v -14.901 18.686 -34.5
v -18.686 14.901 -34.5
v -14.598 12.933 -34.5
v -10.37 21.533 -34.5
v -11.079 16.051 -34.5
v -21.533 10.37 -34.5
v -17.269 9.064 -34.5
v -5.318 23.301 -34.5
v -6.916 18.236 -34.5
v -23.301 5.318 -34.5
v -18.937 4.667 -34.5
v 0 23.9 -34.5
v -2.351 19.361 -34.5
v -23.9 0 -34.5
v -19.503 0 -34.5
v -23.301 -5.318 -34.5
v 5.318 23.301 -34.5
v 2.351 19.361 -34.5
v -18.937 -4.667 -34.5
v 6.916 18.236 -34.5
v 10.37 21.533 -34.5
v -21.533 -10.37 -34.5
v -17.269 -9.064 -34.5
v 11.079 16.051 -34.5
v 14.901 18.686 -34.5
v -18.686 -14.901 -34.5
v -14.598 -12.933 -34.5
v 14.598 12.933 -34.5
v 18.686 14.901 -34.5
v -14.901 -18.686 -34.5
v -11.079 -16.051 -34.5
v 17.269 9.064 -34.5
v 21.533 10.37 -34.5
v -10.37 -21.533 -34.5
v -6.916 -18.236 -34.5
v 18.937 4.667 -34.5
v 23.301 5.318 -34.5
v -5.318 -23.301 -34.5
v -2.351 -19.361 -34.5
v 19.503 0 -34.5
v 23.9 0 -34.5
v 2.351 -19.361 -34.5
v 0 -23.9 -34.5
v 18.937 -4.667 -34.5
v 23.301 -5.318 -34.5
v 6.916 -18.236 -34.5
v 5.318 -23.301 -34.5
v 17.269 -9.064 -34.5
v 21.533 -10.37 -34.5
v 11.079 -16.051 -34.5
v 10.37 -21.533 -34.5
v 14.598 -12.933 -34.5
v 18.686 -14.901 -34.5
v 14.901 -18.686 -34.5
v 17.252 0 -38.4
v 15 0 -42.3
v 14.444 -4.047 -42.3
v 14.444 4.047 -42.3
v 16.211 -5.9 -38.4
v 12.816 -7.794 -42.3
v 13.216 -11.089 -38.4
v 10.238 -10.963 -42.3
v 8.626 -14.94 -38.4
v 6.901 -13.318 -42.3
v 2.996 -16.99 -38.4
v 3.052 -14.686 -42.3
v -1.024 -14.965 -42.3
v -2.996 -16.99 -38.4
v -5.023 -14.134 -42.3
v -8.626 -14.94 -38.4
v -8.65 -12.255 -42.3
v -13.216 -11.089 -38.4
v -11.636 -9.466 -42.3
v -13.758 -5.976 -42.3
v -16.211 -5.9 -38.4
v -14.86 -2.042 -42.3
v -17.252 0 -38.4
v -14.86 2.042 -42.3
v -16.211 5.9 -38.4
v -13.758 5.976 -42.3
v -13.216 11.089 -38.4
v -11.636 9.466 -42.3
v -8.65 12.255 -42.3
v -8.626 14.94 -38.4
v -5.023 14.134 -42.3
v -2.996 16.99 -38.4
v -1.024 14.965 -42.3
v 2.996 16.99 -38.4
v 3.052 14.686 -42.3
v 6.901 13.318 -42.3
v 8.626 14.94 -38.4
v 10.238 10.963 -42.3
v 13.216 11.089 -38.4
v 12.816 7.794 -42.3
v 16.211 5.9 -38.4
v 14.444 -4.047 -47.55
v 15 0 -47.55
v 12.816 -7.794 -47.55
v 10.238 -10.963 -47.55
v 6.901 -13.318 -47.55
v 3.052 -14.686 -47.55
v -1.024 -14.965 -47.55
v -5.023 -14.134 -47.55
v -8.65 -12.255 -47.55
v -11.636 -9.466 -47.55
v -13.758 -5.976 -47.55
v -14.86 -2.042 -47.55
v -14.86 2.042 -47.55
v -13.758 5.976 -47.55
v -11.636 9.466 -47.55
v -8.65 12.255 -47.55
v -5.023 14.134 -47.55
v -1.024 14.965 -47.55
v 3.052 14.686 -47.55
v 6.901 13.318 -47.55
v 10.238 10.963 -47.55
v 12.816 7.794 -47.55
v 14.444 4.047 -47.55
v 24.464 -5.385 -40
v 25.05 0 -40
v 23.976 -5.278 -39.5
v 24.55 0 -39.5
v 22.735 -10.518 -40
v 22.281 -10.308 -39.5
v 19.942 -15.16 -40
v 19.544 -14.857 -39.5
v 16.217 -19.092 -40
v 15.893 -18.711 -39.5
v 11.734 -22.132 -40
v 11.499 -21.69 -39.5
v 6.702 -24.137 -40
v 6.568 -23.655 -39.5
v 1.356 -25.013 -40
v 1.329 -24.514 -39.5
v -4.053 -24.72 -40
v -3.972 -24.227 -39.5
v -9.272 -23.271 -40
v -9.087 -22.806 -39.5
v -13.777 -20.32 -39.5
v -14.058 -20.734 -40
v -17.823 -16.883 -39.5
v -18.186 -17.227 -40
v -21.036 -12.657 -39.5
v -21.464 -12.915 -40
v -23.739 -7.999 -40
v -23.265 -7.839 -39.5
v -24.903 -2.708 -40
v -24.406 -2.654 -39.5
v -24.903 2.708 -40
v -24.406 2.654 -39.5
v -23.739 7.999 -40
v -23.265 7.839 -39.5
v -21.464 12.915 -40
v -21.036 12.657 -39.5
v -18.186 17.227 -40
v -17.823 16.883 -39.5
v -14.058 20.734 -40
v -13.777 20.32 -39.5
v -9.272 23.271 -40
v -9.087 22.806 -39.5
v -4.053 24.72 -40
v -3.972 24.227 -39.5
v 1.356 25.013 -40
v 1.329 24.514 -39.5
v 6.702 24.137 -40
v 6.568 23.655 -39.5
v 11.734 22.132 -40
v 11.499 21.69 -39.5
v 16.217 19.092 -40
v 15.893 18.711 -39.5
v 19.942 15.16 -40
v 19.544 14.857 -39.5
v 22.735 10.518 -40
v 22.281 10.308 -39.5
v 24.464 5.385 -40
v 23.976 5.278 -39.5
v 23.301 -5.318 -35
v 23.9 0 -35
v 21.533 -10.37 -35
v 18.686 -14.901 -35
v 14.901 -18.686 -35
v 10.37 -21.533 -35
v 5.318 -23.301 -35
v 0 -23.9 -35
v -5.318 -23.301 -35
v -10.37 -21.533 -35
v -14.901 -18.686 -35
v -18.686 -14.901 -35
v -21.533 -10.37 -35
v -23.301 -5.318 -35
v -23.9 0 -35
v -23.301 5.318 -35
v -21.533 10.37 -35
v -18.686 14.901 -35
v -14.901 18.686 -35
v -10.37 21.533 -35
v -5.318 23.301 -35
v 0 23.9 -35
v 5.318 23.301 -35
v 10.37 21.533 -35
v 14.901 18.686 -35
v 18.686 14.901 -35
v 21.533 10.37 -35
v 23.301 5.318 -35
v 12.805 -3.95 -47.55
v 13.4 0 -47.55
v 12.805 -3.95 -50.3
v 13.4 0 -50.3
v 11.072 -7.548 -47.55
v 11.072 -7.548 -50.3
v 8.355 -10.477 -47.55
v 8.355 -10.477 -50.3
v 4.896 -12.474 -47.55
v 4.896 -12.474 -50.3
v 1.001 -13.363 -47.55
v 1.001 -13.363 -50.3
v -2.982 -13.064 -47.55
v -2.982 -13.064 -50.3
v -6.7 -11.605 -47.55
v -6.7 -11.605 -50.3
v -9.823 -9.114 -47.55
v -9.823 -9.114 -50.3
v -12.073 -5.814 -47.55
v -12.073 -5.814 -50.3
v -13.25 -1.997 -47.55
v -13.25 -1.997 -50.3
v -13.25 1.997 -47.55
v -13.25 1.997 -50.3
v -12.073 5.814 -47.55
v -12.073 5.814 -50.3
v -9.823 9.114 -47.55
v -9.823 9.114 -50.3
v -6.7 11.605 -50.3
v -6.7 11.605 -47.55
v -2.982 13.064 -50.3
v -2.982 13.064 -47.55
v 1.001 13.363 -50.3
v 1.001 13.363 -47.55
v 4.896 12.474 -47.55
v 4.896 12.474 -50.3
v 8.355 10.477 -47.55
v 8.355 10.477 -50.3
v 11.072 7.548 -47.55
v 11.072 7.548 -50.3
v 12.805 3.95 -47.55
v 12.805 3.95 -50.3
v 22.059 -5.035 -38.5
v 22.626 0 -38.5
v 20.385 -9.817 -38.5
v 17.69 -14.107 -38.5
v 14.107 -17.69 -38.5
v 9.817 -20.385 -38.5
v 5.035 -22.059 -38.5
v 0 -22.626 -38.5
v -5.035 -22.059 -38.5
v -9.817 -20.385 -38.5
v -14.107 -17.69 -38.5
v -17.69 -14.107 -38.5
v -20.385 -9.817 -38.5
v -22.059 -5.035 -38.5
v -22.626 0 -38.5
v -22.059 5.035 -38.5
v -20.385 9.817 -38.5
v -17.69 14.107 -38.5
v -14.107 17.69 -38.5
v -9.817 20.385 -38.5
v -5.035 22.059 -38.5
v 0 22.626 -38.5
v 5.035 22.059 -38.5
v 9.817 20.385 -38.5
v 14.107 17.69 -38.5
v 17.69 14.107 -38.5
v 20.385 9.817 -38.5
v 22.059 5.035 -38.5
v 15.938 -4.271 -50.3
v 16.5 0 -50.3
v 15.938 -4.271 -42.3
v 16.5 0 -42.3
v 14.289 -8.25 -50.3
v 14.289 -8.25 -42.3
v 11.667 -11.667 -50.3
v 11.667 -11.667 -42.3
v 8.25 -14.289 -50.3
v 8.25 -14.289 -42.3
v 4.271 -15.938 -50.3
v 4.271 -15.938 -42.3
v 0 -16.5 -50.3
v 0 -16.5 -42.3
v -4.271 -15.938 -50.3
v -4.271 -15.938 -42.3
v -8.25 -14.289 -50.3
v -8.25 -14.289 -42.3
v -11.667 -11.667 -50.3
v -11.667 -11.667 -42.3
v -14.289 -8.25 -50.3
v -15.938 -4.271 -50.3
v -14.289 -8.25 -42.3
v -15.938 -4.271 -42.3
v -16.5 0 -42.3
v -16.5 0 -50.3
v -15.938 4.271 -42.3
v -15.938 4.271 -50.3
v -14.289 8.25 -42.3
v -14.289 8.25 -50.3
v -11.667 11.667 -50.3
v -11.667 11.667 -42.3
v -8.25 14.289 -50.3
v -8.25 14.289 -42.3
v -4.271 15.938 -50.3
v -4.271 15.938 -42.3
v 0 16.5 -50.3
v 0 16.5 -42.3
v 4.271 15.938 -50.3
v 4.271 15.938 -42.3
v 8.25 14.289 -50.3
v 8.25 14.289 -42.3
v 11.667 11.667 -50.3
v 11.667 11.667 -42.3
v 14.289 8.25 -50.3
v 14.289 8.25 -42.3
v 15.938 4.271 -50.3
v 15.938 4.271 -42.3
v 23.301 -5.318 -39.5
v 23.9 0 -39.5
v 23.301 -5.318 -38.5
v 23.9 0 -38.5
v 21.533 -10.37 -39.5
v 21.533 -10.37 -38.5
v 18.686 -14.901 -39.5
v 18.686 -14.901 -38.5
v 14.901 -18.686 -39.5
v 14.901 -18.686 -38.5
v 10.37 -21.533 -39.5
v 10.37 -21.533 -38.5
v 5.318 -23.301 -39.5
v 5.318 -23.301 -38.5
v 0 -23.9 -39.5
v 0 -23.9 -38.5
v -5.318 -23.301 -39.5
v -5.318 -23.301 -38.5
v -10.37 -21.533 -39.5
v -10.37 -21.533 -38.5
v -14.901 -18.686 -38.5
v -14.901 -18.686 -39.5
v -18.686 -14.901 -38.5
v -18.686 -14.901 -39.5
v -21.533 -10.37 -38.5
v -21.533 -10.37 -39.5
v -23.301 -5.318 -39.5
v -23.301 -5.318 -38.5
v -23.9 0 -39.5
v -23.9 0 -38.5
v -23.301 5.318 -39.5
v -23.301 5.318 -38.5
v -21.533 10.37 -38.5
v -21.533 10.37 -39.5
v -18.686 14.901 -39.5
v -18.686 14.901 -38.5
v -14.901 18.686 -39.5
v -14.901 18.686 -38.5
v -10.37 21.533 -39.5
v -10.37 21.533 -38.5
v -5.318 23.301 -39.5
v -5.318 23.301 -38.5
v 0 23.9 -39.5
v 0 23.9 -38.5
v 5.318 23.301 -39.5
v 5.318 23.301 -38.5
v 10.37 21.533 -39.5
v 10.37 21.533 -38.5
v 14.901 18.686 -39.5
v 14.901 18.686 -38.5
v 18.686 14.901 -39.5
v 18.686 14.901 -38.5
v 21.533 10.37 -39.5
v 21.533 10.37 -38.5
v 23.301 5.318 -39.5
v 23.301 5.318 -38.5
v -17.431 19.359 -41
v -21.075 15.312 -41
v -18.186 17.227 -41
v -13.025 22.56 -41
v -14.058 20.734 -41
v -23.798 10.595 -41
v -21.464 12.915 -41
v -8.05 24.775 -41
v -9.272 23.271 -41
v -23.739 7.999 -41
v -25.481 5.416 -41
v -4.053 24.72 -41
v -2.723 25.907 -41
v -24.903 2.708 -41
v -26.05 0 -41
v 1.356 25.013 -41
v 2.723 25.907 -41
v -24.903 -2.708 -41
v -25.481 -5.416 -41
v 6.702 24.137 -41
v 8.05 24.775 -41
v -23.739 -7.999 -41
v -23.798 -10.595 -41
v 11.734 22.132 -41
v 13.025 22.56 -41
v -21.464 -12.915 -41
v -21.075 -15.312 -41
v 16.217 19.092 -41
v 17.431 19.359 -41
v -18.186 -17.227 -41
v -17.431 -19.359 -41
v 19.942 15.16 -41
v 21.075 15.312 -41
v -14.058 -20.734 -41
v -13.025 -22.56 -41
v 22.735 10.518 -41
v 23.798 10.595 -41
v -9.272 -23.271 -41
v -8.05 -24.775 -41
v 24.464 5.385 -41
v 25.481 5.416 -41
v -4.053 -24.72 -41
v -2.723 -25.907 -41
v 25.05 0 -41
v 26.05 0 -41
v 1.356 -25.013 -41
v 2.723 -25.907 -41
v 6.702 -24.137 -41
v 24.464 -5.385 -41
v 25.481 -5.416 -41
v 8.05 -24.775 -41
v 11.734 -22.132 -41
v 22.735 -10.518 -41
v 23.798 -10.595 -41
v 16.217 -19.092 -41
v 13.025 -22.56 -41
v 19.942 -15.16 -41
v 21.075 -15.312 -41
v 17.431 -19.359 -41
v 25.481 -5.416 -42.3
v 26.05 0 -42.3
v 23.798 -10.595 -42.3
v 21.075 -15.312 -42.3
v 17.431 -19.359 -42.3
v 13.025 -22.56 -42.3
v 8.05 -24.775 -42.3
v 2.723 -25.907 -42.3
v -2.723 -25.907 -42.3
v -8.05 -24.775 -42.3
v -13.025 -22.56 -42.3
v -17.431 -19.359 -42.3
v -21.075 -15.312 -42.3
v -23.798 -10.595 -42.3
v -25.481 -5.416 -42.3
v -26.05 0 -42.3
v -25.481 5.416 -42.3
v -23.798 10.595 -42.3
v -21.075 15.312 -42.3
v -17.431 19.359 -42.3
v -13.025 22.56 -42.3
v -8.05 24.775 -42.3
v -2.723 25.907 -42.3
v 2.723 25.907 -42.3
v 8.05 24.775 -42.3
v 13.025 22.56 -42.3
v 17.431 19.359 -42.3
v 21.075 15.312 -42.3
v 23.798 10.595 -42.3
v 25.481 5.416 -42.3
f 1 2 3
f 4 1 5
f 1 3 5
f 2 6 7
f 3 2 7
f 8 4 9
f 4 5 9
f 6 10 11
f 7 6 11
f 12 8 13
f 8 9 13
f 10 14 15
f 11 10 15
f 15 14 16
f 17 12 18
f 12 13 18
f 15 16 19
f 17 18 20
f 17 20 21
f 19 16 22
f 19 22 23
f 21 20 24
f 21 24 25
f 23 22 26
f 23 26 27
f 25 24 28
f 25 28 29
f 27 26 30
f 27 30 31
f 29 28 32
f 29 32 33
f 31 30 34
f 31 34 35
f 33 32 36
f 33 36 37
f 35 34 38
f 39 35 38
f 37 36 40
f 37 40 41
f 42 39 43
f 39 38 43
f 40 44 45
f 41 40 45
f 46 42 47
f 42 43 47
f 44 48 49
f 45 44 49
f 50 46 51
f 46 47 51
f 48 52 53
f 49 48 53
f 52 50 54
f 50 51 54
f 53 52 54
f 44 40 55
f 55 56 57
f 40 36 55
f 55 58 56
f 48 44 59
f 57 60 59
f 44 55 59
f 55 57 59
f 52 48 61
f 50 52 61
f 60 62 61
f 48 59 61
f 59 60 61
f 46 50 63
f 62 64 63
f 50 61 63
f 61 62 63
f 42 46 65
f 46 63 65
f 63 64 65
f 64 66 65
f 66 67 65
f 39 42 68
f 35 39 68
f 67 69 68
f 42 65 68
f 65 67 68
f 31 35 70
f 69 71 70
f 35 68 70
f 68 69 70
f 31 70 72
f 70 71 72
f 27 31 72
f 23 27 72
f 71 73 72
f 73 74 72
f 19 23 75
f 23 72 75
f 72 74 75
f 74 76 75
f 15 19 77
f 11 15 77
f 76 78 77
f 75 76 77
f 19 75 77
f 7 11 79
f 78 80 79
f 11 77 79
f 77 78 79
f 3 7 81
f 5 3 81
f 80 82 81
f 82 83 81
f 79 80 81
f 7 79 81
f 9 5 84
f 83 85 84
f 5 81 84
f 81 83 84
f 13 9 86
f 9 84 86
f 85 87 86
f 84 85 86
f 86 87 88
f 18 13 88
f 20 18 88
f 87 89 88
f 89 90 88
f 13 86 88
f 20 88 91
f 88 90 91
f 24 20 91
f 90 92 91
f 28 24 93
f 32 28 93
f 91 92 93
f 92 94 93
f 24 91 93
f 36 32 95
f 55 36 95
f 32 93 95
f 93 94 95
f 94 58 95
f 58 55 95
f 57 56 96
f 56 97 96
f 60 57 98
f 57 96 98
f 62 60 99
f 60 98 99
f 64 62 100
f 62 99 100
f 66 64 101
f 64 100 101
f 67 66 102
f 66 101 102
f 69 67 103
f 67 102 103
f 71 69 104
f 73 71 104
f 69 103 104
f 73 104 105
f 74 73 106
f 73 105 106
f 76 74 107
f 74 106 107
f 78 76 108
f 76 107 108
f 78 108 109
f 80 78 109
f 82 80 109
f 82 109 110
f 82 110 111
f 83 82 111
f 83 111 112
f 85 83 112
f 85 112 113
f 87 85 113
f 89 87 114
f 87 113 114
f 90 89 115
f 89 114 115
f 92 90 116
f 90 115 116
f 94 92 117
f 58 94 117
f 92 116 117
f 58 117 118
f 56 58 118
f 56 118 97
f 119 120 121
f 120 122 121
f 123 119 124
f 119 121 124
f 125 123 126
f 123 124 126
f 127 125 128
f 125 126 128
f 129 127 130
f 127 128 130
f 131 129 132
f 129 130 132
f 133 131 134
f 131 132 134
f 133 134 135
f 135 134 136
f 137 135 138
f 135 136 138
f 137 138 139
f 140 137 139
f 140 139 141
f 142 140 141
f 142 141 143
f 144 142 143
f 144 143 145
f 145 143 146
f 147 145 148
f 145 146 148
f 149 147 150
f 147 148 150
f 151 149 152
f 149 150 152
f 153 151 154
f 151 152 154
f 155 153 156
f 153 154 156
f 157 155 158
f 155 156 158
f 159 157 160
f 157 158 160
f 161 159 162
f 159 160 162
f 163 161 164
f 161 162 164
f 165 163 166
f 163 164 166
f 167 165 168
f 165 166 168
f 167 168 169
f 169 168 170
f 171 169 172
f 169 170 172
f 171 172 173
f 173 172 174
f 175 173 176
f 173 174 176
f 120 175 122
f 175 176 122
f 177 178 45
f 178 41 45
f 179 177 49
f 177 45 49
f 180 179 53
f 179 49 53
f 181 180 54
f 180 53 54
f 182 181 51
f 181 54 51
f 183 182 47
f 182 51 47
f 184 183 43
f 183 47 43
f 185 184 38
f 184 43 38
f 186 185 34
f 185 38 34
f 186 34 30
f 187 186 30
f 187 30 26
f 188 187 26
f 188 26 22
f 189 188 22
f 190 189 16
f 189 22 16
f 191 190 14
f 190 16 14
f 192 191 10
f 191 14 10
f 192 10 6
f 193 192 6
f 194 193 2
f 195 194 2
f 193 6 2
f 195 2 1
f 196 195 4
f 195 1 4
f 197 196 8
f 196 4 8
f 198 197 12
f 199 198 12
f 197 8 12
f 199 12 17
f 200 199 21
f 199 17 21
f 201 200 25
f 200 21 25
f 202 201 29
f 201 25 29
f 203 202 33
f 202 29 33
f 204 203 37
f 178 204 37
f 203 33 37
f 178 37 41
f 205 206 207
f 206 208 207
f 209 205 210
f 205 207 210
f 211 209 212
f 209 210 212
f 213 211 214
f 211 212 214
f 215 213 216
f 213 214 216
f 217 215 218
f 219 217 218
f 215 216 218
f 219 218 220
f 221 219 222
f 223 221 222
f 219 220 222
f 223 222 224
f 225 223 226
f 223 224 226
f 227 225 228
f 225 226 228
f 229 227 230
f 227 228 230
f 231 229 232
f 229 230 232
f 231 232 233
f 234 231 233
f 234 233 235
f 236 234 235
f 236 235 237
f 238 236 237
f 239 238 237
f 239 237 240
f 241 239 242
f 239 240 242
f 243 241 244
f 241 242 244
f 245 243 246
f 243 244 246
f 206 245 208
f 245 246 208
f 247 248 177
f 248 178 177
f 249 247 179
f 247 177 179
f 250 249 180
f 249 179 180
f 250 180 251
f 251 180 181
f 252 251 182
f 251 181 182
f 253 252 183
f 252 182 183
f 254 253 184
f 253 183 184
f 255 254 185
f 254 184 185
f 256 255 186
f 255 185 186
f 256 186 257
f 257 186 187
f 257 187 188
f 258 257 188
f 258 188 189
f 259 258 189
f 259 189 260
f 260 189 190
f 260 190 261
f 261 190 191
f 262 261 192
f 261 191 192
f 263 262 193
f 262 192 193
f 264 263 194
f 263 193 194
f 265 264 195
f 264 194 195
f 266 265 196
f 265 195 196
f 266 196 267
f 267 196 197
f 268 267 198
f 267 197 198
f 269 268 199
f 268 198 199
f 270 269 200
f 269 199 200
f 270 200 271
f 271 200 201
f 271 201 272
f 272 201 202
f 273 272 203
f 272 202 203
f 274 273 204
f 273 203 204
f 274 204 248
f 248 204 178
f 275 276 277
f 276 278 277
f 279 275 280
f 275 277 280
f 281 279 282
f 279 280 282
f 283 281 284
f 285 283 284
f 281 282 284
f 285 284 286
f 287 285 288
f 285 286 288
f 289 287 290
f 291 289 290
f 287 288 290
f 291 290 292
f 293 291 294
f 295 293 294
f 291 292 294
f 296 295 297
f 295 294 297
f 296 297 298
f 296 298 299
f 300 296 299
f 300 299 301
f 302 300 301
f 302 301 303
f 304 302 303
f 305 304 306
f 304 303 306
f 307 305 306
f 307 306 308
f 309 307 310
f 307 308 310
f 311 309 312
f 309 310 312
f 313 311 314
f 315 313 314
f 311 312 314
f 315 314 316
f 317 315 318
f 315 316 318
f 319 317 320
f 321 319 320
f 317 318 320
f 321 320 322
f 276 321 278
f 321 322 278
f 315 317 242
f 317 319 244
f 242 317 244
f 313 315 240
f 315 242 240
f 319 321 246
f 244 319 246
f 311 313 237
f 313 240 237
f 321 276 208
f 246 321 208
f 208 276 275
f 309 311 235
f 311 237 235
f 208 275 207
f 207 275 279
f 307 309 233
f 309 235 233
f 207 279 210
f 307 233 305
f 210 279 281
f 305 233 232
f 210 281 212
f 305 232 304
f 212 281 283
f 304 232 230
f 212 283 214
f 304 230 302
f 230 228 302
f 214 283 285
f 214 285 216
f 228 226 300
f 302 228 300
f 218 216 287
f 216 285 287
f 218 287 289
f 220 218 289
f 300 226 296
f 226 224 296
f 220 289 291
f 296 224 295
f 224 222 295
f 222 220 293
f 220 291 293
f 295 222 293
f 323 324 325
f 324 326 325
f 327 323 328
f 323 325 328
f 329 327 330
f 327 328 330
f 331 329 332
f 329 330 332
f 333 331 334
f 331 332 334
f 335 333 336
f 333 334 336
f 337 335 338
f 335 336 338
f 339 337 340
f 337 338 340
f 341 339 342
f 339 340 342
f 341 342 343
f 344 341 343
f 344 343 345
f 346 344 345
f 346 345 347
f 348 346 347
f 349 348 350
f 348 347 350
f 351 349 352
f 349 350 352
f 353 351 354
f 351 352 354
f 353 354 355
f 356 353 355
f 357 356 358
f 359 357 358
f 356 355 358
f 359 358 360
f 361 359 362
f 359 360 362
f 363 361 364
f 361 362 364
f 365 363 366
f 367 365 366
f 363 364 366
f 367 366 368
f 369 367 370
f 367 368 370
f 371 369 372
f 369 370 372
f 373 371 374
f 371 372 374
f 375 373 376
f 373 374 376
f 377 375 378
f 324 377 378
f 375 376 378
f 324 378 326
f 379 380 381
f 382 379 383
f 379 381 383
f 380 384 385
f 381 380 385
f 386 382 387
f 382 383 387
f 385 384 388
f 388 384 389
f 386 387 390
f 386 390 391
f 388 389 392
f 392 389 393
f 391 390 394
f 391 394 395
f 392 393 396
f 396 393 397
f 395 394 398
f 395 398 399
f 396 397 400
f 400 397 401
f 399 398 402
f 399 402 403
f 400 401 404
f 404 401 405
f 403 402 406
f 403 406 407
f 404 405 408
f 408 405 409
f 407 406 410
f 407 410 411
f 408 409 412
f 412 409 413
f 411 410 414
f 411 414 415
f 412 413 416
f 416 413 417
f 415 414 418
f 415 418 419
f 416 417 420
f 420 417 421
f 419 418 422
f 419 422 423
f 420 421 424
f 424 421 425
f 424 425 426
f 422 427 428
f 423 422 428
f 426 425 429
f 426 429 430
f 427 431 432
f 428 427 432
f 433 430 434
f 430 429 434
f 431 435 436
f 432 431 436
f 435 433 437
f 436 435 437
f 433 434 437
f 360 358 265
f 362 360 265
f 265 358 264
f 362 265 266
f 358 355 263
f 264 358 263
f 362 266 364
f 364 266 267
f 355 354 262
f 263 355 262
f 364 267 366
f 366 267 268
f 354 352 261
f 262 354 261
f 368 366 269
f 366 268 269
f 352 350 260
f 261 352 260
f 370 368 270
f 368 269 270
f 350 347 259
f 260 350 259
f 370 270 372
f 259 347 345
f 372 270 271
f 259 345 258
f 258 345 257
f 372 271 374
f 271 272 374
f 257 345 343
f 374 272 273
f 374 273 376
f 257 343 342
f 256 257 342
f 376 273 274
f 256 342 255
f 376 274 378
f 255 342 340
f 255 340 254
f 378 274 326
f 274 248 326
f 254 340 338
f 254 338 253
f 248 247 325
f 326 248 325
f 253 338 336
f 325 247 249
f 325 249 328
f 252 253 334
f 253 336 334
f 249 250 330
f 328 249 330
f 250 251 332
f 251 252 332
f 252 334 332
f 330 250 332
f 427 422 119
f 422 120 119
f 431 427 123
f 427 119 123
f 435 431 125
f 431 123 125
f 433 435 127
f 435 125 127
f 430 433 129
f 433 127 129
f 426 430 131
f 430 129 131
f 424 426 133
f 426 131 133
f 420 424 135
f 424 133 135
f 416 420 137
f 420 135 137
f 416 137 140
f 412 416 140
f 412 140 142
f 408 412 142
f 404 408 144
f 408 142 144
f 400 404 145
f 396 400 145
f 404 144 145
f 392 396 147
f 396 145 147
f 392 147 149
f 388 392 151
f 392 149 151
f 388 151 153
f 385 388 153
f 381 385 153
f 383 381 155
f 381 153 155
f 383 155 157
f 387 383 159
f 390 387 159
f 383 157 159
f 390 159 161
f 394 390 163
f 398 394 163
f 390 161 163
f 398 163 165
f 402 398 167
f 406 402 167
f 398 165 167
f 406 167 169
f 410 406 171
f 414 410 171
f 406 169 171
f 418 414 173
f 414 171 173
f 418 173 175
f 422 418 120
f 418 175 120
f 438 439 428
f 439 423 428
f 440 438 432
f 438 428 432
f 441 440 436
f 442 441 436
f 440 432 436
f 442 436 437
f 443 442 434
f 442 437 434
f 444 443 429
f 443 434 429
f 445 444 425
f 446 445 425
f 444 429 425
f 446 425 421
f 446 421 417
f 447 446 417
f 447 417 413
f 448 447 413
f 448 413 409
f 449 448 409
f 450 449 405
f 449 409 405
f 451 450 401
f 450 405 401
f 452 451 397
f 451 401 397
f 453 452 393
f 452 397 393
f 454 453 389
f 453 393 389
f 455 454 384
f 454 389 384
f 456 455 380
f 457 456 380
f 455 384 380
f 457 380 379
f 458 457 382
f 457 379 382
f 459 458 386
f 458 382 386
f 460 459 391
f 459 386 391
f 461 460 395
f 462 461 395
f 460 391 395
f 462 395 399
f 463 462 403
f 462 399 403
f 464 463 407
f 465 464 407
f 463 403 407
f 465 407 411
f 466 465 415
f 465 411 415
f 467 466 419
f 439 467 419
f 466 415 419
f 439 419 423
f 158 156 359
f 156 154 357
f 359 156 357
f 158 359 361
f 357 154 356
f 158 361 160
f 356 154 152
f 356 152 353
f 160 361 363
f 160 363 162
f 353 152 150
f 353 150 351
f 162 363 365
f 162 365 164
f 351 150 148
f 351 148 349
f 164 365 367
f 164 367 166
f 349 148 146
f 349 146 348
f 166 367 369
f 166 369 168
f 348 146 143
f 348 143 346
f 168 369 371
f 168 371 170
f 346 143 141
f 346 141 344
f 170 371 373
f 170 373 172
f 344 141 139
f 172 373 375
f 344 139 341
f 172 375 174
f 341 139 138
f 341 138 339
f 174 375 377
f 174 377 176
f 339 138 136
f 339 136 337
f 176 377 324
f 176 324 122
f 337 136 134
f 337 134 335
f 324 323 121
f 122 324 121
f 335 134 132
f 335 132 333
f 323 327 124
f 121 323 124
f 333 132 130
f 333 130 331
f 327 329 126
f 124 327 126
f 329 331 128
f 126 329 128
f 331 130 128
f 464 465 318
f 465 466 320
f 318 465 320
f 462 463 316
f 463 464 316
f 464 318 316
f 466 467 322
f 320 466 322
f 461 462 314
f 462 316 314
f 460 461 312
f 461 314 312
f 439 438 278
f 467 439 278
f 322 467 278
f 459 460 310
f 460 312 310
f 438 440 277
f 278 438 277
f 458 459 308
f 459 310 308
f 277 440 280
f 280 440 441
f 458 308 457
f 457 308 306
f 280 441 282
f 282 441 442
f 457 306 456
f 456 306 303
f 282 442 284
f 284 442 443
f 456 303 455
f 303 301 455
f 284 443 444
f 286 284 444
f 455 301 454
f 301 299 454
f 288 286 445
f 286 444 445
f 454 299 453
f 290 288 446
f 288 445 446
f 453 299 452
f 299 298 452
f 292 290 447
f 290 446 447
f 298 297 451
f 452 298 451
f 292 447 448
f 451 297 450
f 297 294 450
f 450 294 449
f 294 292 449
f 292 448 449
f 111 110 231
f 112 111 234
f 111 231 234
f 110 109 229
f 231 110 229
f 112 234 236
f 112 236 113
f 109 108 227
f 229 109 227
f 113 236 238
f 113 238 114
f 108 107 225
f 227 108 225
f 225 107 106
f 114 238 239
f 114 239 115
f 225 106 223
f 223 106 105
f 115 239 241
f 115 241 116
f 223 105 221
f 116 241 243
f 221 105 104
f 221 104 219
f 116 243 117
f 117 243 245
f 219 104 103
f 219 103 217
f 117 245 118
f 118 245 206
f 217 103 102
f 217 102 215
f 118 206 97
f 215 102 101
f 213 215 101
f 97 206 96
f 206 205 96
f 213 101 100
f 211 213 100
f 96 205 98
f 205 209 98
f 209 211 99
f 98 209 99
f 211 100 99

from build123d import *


with BuildPart() as f1:
    # F0 (on Front) → F1 (revolve)
    with BuildSketch(Plane.XZ):
        Polygon((23.9, -34.5), (19.503332, -34.5), (15, -42.3), (15, -47.55), (13.4, -47.55), (13.4, -50.3), (16.5, -50.3), (16.5, -42.3), (26.05, -42.3), (26.05, -41), (25.05, -41), (25.05, -40), (24.55, -39.5), (23.9, -39.5), (23.9, -38.5), (22.626104, -38.5), (23.9, -35), align=None)
    revolve(axis=Axis((0, 0, -9.429786), (0, 0, -1)))


solid = f1.part
